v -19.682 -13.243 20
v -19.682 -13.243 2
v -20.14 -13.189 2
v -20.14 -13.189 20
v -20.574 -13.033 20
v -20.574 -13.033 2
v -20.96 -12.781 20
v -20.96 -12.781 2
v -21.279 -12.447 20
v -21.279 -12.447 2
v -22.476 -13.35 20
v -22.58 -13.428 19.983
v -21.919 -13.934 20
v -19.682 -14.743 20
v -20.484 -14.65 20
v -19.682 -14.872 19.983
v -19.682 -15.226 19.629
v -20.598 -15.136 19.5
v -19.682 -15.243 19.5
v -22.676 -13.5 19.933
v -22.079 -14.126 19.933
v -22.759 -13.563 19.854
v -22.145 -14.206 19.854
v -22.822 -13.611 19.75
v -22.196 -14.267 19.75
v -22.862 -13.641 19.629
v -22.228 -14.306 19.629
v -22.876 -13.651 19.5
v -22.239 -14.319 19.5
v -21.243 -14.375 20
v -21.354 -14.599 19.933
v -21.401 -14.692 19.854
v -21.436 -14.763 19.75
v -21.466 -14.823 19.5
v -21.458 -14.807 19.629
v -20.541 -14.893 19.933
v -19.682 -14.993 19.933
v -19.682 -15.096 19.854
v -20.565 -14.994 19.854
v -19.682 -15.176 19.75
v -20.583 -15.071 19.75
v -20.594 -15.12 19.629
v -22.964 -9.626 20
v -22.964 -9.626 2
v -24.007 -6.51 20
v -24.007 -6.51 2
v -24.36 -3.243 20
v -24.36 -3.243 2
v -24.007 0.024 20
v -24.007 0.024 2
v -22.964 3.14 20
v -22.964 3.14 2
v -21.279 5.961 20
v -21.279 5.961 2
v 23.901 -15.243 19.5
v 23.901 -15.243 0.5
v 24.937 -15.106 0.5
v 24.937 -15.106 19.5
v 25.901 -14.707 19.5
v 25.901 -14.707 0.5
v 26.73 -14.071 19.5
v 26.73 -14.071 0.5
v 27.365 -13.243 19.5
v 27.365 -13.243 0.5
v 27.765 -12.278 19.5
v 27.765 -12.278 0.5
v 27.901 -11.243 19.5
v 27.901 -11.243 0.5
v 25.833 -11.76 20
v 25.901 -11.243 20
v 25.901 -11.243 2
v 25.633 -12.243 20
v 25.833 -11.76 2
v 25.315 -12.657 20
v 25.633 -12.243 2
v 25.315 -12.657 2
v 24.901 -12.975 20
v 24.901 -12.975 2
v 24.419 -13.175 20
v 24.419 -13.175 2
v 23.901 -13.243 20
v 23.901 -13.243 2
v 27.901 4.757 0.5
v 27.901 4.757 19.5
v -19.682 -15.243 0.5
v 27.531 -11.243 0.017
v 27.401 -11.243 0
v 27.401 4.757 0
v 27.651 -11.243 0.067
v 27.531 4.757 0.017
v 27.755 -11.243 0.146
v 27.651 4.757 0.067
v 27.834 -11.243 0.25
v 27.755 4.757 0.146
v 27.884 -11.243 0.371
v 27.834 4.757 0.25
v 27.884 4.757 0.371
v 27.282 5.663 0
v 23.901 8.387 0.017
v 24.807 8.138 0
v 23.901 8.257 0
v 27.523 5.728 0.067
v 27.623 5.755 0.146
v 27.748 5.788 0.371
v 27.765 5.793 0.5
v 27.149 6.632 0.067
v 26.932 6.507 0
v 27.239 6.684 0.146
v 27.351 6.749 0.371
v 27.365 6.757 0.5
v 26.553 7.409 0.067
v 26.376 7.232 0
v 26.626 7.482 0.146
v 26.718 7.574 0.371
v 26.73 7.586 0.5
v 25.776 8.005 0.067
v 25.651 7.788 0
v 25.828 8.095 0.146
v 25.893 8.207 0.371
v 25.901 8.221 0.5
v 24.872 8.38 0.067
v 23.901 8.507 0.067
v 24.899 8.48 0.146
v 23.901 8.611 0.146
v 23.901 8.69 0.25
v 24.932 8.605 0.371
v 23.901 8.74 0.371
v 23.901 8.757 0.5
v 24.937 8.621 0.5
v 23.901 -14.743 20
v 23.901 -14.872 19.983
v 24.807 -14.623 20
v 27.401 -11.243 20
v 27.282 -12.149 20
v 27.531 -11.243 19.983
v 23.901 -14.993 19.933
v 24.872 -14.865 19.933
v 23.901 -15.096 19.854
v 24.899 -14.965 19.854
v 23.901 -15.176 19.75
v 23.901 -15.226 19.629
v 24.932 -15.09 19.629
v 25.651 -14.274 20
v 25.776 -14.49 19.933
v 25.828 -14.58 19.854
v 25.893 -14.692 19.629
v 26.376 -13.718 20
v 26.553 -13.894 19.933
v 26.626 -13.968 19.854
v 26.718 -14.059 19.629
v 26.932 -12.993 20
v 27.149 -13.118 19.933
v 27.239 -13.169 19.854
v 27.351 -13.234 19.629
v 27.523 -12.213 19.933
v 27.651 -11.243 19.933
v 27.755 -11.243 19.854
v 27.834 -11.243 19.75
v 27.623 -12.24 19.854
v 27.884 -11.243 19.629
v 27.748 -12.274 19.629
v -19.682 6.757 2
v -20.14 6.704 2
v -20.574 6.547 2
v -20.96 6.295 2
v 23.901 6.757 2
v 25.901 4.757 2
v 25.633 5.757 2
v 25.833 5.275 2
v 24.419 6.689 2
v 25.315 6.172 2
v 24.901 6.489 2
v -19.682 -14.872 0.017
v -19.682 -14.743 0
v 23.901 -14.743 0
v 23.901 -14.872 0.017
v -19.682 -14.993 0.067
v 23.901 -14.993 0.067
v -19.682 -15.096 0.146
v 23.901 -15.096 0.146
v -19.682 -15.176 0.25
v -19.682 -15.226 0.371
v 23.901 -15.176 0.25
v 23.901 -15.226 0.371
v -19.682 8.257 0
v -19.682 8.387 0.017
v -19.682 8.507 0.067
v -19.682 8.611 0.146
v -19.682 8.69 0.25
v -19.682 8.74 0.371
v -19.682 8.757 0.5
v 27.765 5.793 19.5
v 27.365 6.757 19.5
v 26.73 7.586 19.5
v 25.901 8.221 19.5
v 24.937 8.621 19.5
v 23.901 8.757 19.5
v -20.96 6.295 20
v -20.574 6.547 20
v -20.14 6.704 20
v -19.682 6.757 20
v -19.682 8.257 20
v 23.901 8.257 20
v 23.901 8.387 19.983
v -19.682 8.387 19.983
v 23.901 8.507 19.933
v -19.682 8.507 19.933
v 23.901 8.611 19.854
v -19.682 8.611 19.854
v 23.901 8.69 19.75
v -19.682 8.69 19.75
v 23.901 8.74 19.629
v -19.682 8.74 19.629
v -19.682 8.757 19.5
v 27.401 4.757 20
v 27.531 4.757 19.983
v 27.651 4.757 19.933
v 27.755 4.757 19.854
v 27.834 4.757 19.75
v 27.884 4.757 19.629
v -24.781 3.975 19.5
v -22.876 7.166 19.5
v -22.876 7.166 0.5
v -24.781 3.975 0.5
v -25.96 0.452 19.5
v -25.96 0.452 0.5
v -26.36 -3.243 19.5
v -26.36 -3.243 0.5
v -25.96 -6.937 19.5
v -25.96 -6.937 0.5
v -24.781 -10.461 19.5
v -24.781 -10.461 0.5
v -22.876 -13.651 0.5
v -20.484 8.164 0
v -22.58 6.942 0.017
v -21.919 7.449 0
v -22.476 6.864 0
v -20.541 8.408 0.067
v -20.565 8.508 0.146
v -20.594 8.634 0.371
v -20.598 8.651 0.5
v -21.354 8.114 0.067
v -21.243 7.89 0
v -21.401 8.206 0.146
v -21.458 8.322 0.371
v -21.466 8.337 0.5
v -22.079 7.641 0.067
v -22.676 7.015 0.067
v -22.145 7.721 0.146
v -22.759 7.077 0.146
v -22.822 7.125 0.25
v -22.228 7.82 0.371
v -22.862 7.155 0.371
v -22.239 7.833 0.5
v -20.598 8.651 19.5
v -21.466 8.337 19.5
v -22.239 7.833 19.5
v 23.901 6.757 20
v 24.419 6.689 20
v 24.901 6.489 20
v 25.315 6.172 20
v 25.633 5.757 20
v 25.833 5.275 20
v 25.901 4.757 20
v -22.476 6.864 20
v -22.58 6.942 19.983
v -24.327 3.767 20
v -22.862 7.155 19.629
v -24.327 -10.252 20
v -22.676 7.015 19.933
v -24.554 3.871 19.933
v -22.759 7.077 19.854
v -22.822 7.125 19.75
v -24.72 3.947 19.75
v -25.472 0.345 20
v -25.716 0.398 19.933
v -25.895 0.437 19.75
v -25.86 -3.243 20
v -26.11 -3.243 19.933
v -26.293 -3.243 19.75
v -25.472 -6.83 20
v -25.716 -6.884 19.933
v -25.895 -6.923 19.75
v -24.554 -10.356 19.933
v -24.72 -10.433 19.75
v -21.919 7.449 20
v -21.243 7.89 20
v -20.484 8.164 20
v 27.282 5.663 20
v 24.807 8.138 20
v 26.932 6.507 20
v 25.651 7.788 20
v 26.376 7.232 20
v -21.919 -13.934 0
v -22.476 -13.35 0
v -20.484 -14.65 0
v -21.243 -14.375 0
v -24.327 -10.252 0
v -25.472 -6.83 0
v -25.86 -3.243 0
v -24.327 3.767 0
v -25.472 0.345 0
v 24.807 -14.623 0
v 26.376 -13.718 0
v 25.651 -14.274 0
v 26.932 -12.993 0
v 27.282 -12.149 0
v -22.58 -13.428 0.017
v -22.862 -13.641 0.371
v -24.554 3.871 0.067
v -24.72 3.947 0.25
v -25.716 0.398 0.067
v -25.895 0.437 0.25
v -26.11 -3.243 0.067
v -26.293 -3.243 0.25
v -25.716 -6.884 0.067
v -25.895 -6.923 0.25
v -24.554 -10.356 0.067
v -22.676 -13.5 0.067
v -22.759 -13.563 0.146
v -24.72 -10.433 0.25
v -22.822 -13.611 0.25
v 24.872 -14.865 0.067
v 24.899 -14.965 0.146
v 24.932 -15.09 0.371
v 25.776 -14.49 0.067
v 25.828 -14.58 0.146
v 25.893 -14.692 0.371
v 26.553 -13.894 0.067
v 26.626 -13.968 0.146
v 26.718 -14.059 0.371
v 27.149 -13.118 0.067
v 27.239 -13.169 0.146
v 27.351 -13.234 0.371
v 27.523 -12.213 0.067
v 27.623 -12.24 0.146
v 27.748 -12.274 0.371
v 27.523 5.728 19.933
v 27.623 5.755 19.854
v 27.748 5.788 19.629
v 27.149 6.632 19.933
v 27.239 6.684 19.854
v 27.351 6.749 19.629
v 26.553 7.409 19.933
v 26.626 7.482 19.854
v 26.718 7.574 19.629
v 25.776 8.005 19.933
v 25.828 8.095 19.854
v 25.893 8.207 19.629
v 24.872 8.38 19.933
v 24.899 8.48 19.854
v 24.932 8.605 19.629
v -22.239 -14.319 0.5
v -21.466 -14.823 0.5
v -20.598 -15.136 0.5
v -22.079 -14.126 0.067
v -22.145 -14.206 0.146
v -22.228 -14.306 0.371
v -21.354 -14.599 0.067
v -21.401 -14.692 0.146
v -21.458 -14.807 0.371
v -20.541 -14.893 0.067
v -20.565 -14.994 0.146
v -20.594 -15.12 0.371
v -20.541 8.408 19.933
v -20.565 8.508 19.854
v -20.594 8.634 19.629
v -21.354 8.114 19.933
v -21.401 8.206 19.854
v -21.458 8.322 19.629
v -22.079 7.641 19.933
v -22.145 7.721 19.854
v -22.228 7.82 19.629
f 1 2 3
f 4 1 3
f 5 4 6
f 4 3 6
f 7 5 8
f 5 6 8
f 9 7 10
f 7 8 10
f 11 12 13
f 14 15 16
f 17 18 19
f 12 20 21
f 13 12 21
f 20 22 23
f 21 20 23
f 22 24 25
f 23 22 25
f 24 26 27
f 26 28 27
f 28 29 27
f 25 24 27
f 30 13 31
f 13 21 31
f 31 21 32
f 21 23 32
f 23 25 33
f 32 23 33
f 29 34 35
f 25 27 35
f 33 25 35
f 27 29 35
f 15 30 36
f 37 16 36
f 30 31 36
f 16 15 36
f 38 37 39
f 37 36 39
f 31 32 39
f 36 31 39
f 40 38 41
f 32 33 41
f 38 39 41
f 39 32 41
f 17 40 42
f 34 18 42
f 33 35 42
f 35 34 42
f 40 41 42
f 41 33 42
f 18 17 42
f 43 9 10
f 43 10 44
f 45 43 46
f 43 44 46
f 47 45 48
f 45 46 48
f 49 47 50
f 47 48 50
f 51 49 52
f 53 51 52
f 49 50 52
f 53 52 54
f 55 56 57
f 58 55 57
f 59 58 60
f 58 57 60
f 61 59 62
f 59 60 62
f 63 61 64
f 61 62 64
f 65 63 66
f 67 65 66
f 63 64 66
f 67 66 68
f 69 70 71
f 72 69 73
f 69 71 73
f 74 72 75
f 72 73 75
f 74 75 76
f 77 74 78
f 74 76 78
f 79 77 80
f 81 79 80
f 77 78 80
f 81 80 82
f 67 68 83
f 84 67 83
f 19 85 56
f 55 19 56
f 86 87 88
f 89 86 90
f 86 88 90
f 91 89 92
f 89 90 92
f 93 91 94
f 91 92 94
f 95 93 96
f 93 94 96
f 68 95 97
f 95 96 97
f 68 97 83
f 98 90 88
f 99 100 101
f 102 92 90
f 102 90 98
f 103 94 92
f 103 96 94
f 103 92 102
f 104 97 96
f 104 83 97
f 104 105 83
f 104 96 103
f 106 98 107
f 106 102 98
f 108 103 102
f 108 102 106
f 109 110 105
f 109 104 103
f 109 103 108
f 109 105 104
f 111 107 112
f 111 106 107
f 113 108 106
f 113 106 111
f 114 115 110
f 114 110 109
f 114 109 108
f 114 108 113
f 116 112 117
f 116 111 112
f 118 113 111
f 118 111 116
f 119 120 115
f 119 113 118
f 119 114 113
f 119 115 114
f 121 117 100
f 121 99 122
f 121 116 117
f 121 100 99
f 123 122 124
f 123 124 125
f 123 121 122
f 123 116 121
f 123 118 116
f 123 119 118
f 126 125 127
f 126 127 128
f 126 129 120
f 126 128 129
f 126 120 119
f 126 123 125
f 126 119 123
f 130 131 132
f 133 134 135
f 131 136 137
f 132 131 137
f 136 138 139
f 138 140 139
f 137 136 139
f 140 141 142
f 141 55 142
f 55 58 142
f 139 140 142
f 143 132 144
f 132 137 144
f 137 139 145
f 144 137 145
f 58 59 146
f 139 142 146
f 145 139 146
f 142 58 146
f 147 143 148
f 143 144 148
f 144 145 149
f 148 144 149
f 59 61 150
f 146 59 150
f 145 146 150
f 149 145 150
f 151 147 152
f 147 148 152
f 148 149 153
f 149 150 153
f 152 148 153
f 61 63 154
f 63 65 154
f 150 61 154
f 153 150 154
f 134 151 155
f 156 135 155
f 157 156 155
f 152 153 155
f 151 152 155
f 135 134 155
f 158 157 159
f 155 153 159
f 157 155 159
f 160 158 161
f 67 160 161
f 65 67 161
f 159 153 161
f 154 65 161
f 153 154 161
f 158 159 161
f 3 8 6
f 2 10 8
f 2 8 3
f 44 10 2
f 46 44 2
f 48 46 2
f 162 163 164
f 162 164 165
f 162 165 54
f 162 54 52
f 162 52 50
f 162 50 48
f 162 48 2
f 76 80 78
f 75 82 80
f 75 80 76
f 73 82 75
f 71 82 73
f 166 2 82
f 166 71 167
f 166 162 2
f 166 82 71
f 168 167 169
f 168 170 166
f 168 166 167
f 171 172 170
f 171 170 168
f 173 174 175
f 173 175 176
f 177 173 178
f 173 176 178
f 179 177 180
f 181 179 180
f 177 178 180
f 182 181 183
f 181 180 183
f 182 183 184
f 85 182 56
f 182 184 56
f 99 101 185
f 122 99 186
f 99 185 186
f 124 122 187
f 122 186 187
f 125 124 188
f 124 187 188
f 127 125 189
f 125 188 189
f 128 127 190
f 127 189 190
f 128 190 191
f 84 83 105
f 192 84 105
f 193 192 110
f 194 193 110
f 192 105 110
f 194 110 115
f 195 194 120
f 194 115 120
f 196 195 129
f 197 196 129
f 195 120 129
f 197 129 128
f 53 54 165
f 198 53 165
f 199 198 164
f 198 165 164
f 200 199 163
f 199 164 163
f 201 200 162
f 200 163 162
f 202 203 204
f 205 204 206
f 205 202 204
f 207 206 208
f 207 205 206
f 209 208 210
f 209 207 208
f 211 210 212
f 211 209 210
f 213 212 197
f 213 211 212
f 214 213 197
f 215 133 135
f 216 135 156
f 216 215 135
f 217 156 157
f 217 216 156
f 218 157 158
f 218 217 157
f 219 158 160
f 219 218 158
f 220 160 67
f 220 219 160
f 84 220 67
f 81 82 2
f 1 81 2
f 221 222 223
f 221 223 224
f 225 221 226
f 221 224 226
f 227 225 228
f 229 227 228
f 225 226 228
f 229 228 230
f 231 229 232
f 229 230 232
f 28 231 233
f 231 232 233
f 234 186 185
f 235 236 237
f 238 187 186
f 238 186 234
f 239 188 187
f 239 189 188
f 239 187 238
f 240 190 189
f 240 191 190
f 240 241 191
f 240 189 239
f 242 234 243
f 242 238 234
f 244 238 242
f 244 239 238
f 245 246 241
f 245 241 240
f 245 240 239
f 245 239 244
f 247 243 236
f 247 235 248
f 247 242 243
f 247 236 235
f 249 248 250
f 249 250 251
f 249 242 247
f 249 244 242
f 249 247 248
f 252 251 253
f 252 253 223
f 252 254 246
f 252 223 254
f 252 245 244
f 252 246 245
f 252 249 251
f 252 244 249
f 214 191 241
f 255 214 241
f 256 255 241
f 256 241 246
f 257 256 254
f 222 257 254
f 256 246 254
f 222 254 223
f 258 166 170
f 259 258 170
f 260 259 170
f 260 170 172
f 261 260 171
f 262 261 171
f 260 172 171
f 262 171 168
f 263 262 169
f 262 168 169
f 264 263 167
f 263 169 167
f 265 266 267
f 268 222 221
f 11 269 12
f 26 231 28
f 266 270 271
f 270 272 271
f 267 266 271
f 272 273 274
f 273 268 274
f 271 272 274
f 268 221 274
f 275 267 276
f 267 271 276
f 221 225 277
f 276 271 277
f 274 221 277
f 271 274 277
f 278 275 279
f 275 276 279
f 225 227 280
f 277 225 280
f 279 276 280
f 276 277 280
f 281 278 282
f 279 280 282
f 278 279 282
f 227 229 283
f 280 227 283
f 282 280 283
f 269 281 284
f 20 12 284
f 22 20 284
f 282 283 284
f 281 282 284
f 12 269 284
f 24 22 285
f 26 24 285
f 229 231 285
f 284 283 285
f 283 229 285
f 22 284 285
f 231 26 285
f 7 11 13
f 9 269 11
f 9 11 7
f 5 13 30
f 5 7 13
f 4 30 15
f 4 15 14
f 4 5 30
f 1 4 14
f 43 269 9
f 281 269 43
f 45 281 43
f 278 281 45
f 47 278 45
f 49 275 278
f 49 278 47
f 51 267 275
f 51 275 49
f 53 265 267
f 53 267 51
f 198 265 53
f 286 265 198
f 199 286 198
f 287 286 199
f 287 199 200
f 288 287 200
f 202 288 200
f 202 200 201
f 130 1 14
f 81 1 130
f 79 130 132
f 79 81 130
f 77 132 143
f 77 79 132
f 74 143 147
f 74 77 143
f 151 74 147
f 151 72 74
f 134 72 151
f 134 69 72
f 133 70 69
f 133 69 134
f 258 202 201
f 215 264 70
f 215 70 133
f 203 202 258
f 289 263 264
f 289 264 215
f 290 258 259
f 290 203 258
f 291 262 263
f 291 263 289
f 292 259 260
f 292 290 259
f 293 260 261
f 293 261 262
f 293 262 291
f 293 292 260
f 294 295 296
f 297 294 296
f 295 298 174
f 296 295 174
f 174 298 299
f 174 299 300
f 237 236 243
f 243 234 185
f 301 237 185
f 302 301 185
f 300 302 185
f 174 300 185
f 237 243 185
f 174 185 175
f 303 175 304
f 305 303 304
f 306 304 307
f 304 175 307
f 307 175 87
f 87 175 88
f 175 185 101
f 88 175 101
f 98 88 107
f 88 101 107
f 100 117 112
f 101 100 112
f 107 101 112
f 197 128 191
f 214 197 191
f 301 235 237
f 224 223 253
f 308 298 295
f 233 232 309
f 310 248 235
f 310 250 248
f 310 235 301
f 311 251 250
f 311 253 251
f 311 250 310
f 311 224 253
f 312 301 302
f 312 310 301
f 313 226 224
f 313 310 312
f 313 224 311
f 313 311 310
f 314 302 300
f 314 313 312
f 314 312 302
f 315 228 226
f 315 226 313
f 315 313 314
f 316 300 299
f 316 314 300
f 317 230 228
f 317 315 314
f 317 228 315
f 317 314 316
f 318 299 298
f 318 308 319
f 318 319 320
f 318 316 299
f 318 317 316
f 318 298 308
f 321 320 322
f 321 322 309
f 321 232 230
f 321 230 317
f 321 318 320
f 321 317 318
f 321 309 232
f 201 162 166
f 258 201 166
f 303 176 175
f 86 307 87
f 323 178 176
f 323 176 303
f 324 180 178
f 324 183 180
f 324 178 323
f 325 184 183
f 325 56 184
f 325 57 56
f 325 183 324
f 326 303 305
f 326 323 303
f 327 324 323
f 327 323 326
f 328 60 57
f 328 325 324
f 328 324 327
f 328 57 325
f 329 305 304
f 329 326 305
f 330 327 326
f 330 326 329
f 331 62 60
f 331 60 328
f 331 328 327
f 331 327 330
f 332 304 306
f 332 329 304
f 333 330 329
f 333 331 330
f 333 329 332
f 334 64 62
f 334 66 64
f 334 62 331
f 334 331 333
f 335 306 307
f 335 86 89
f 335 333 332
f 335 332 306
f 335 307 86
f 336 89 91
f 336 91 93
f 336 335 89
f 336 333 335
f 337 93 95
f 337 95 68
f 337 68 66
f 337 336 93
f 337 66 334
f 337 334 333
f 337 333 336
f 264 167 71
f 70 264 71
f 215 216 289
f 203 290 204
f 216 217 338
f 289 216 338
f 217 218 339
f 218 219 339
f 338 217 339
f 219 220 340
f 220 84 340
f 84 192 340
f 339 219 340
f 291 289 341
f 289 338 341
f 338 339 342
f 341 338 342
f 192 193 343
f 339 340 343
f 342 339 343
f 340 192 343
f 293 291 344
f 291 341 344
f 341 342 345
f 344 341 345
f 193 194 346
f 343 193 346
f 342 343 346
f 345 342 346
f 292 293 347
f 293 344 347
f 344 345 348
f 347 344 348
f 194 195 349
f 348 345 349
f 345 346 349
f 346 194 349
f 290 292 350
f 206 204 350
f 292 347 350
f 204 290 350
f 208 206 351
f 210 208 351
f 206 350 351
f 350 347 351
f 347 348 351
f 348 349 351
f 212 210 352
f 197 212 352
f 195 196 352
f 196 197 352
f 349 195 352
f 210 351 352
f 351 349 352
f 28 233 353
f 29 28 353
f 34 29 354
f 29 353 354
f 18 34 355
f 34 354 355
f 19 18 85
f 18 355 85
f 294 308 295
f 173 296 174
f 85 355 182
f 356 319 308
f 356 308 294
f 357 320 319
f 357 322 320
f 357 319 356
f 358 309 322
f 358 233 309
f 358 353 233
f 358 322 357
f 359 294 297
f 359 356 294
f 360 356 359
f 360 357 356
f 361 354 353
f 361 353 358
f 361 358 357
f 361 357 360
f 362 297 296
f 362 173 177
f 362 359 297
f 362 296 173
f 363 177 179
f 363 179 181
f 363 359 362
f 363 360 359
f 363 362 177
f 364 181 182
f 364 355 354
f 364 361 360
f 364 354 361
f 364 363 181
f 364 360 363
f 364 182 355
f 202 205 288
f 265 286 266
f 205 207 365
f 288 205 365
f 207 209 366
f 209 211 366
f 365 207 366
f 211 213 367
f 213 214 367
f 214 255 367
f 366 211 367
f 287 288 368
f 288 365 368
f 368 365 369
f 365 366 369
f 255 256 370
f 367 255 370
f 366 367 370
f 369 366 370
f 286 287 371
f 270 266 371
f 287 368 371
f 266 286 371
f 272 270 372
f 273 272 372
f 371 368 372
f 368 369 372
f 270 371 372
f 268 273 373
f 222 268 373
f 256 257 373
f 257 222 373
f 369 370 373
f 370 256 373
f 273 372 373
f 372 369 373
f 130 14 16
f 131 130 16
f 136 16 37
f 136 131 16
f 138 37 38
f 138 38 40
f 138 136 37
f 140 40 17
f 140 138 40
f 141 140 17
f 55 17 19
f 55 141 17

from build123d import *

# Parameters (mm, degrees)
F1_DEPTH = 2
F2_DEPTH = 20
F3_R     = 0.5
F4_R     = 0.5


with BuildPart() as f1:
    # F0 (on Top) → F1 (new body)
    with BuildSketch(Plane.XY):
        with BuildLine():
            ThreePointArc((25.901247, 4.7573), (25.315461, 6.171513), (23.901247, 6.7573))
            Line((23.901247, 6.7573), (-19.681736, 6.7573))
            ThreePointArc((-19.681736, 6.7573), (-20.573861, 6.547304), (-21.278643, 5.961413))
            ThreePointArc((-21.278643, 5.961413), (-24.359844, -3.2427), (-21.278643, -12.446813))
            ThreePointArc((-21.278643, -12.446813), (-20.573861, -13.032704), (-19.681736, -13.2427))
            Line((-19.681736, -13.2427), (23.901247, -13.2427))
            ThreePointArc((23.901247, -13.2427), (25.315461, -12.656914), (25.901247, -11.2427))
            Line((25.901247, -11.2427), (25.901247, 4.7573))
        make_face()
    extrude(amount=F1_DEPTH)

    # F0 (on Top) → F2 (join)
    with BuildSketch(Plane.XY):
        with BuildLine():
            Line((27.901247, -11.2427), (27.901247, 4.7573))
            ThreePointArc((27.901247, 4.7573), (26.729674, 7.585727), (23.901247, 8.7573))
            Line((23.901247, 8.7573), (-19.681736, 8.7573))
            ThreePointArc((-19.681736, 8.7573), (-21.465986, 8.337307), (-22.875549, 7.165527))
            ThreePointArc((-22.875549, 7.165527), (-26.359844, -3.2427), (-22.875549, -13.650927))
            ThreePointArc((-22.875549, -13.650927), (-21.465986, -14.822708), (-19.681736, -15.2427))
            Line((-19.681736, -15.2427), (23.901247, -15.2427))
            ThreePointArc((23.901247, -15.2427), (26.729674, -14.071127), (27.901247, -11.2427))
        make_face()
        with BuildLine():
            Line((-19.681736, 6.7573), (23.901247, 6.7573))
            ThreePointArc((23.901247, 6.7573), (25.315461, 6.171513), (25.901247, 4.7573))
            Line((25.901247, 4.7573), (25.901247, -11.2427))
            ThreePointArc((25.901247, -11.2427), (25.315461, -12.656914), (23.901247, -13.2427))
            Line((23.901247, -13.2427), (-19.681736, -13.2427))
            ThreePointArc((-19.681736, -13.2427), (-20.573861, -13.032704), (-21.278643, -12.446813))
            ThreePointArc((-21.278643, -12.446813), (-24.359844, -3.2427), (-21.278643, 5.961413))
            ThreePointArc((-21.278643, 5.961413), (-20.573861, 6.547304), (-19.681736, 6.7573))
        make_face(mode=Mode.SUBTRACT)
    extrude(amount=F2_DEPTH)

    # F3
    f3_edges = [f1.edges().sort_by_distance(p)[0] for p in [
        (2.109756, -15.2427, 0),
    ]]
    fillet(f3_edges, radius=F3_R)

    # F4
    f4_edges = [f1.edges().sort_by_distance(p)[0] for p in [
        (2.109756, -15.2427, 20),
    ]]
    fillet(f4_edges, radius=F4_R)


solid = f1.part
